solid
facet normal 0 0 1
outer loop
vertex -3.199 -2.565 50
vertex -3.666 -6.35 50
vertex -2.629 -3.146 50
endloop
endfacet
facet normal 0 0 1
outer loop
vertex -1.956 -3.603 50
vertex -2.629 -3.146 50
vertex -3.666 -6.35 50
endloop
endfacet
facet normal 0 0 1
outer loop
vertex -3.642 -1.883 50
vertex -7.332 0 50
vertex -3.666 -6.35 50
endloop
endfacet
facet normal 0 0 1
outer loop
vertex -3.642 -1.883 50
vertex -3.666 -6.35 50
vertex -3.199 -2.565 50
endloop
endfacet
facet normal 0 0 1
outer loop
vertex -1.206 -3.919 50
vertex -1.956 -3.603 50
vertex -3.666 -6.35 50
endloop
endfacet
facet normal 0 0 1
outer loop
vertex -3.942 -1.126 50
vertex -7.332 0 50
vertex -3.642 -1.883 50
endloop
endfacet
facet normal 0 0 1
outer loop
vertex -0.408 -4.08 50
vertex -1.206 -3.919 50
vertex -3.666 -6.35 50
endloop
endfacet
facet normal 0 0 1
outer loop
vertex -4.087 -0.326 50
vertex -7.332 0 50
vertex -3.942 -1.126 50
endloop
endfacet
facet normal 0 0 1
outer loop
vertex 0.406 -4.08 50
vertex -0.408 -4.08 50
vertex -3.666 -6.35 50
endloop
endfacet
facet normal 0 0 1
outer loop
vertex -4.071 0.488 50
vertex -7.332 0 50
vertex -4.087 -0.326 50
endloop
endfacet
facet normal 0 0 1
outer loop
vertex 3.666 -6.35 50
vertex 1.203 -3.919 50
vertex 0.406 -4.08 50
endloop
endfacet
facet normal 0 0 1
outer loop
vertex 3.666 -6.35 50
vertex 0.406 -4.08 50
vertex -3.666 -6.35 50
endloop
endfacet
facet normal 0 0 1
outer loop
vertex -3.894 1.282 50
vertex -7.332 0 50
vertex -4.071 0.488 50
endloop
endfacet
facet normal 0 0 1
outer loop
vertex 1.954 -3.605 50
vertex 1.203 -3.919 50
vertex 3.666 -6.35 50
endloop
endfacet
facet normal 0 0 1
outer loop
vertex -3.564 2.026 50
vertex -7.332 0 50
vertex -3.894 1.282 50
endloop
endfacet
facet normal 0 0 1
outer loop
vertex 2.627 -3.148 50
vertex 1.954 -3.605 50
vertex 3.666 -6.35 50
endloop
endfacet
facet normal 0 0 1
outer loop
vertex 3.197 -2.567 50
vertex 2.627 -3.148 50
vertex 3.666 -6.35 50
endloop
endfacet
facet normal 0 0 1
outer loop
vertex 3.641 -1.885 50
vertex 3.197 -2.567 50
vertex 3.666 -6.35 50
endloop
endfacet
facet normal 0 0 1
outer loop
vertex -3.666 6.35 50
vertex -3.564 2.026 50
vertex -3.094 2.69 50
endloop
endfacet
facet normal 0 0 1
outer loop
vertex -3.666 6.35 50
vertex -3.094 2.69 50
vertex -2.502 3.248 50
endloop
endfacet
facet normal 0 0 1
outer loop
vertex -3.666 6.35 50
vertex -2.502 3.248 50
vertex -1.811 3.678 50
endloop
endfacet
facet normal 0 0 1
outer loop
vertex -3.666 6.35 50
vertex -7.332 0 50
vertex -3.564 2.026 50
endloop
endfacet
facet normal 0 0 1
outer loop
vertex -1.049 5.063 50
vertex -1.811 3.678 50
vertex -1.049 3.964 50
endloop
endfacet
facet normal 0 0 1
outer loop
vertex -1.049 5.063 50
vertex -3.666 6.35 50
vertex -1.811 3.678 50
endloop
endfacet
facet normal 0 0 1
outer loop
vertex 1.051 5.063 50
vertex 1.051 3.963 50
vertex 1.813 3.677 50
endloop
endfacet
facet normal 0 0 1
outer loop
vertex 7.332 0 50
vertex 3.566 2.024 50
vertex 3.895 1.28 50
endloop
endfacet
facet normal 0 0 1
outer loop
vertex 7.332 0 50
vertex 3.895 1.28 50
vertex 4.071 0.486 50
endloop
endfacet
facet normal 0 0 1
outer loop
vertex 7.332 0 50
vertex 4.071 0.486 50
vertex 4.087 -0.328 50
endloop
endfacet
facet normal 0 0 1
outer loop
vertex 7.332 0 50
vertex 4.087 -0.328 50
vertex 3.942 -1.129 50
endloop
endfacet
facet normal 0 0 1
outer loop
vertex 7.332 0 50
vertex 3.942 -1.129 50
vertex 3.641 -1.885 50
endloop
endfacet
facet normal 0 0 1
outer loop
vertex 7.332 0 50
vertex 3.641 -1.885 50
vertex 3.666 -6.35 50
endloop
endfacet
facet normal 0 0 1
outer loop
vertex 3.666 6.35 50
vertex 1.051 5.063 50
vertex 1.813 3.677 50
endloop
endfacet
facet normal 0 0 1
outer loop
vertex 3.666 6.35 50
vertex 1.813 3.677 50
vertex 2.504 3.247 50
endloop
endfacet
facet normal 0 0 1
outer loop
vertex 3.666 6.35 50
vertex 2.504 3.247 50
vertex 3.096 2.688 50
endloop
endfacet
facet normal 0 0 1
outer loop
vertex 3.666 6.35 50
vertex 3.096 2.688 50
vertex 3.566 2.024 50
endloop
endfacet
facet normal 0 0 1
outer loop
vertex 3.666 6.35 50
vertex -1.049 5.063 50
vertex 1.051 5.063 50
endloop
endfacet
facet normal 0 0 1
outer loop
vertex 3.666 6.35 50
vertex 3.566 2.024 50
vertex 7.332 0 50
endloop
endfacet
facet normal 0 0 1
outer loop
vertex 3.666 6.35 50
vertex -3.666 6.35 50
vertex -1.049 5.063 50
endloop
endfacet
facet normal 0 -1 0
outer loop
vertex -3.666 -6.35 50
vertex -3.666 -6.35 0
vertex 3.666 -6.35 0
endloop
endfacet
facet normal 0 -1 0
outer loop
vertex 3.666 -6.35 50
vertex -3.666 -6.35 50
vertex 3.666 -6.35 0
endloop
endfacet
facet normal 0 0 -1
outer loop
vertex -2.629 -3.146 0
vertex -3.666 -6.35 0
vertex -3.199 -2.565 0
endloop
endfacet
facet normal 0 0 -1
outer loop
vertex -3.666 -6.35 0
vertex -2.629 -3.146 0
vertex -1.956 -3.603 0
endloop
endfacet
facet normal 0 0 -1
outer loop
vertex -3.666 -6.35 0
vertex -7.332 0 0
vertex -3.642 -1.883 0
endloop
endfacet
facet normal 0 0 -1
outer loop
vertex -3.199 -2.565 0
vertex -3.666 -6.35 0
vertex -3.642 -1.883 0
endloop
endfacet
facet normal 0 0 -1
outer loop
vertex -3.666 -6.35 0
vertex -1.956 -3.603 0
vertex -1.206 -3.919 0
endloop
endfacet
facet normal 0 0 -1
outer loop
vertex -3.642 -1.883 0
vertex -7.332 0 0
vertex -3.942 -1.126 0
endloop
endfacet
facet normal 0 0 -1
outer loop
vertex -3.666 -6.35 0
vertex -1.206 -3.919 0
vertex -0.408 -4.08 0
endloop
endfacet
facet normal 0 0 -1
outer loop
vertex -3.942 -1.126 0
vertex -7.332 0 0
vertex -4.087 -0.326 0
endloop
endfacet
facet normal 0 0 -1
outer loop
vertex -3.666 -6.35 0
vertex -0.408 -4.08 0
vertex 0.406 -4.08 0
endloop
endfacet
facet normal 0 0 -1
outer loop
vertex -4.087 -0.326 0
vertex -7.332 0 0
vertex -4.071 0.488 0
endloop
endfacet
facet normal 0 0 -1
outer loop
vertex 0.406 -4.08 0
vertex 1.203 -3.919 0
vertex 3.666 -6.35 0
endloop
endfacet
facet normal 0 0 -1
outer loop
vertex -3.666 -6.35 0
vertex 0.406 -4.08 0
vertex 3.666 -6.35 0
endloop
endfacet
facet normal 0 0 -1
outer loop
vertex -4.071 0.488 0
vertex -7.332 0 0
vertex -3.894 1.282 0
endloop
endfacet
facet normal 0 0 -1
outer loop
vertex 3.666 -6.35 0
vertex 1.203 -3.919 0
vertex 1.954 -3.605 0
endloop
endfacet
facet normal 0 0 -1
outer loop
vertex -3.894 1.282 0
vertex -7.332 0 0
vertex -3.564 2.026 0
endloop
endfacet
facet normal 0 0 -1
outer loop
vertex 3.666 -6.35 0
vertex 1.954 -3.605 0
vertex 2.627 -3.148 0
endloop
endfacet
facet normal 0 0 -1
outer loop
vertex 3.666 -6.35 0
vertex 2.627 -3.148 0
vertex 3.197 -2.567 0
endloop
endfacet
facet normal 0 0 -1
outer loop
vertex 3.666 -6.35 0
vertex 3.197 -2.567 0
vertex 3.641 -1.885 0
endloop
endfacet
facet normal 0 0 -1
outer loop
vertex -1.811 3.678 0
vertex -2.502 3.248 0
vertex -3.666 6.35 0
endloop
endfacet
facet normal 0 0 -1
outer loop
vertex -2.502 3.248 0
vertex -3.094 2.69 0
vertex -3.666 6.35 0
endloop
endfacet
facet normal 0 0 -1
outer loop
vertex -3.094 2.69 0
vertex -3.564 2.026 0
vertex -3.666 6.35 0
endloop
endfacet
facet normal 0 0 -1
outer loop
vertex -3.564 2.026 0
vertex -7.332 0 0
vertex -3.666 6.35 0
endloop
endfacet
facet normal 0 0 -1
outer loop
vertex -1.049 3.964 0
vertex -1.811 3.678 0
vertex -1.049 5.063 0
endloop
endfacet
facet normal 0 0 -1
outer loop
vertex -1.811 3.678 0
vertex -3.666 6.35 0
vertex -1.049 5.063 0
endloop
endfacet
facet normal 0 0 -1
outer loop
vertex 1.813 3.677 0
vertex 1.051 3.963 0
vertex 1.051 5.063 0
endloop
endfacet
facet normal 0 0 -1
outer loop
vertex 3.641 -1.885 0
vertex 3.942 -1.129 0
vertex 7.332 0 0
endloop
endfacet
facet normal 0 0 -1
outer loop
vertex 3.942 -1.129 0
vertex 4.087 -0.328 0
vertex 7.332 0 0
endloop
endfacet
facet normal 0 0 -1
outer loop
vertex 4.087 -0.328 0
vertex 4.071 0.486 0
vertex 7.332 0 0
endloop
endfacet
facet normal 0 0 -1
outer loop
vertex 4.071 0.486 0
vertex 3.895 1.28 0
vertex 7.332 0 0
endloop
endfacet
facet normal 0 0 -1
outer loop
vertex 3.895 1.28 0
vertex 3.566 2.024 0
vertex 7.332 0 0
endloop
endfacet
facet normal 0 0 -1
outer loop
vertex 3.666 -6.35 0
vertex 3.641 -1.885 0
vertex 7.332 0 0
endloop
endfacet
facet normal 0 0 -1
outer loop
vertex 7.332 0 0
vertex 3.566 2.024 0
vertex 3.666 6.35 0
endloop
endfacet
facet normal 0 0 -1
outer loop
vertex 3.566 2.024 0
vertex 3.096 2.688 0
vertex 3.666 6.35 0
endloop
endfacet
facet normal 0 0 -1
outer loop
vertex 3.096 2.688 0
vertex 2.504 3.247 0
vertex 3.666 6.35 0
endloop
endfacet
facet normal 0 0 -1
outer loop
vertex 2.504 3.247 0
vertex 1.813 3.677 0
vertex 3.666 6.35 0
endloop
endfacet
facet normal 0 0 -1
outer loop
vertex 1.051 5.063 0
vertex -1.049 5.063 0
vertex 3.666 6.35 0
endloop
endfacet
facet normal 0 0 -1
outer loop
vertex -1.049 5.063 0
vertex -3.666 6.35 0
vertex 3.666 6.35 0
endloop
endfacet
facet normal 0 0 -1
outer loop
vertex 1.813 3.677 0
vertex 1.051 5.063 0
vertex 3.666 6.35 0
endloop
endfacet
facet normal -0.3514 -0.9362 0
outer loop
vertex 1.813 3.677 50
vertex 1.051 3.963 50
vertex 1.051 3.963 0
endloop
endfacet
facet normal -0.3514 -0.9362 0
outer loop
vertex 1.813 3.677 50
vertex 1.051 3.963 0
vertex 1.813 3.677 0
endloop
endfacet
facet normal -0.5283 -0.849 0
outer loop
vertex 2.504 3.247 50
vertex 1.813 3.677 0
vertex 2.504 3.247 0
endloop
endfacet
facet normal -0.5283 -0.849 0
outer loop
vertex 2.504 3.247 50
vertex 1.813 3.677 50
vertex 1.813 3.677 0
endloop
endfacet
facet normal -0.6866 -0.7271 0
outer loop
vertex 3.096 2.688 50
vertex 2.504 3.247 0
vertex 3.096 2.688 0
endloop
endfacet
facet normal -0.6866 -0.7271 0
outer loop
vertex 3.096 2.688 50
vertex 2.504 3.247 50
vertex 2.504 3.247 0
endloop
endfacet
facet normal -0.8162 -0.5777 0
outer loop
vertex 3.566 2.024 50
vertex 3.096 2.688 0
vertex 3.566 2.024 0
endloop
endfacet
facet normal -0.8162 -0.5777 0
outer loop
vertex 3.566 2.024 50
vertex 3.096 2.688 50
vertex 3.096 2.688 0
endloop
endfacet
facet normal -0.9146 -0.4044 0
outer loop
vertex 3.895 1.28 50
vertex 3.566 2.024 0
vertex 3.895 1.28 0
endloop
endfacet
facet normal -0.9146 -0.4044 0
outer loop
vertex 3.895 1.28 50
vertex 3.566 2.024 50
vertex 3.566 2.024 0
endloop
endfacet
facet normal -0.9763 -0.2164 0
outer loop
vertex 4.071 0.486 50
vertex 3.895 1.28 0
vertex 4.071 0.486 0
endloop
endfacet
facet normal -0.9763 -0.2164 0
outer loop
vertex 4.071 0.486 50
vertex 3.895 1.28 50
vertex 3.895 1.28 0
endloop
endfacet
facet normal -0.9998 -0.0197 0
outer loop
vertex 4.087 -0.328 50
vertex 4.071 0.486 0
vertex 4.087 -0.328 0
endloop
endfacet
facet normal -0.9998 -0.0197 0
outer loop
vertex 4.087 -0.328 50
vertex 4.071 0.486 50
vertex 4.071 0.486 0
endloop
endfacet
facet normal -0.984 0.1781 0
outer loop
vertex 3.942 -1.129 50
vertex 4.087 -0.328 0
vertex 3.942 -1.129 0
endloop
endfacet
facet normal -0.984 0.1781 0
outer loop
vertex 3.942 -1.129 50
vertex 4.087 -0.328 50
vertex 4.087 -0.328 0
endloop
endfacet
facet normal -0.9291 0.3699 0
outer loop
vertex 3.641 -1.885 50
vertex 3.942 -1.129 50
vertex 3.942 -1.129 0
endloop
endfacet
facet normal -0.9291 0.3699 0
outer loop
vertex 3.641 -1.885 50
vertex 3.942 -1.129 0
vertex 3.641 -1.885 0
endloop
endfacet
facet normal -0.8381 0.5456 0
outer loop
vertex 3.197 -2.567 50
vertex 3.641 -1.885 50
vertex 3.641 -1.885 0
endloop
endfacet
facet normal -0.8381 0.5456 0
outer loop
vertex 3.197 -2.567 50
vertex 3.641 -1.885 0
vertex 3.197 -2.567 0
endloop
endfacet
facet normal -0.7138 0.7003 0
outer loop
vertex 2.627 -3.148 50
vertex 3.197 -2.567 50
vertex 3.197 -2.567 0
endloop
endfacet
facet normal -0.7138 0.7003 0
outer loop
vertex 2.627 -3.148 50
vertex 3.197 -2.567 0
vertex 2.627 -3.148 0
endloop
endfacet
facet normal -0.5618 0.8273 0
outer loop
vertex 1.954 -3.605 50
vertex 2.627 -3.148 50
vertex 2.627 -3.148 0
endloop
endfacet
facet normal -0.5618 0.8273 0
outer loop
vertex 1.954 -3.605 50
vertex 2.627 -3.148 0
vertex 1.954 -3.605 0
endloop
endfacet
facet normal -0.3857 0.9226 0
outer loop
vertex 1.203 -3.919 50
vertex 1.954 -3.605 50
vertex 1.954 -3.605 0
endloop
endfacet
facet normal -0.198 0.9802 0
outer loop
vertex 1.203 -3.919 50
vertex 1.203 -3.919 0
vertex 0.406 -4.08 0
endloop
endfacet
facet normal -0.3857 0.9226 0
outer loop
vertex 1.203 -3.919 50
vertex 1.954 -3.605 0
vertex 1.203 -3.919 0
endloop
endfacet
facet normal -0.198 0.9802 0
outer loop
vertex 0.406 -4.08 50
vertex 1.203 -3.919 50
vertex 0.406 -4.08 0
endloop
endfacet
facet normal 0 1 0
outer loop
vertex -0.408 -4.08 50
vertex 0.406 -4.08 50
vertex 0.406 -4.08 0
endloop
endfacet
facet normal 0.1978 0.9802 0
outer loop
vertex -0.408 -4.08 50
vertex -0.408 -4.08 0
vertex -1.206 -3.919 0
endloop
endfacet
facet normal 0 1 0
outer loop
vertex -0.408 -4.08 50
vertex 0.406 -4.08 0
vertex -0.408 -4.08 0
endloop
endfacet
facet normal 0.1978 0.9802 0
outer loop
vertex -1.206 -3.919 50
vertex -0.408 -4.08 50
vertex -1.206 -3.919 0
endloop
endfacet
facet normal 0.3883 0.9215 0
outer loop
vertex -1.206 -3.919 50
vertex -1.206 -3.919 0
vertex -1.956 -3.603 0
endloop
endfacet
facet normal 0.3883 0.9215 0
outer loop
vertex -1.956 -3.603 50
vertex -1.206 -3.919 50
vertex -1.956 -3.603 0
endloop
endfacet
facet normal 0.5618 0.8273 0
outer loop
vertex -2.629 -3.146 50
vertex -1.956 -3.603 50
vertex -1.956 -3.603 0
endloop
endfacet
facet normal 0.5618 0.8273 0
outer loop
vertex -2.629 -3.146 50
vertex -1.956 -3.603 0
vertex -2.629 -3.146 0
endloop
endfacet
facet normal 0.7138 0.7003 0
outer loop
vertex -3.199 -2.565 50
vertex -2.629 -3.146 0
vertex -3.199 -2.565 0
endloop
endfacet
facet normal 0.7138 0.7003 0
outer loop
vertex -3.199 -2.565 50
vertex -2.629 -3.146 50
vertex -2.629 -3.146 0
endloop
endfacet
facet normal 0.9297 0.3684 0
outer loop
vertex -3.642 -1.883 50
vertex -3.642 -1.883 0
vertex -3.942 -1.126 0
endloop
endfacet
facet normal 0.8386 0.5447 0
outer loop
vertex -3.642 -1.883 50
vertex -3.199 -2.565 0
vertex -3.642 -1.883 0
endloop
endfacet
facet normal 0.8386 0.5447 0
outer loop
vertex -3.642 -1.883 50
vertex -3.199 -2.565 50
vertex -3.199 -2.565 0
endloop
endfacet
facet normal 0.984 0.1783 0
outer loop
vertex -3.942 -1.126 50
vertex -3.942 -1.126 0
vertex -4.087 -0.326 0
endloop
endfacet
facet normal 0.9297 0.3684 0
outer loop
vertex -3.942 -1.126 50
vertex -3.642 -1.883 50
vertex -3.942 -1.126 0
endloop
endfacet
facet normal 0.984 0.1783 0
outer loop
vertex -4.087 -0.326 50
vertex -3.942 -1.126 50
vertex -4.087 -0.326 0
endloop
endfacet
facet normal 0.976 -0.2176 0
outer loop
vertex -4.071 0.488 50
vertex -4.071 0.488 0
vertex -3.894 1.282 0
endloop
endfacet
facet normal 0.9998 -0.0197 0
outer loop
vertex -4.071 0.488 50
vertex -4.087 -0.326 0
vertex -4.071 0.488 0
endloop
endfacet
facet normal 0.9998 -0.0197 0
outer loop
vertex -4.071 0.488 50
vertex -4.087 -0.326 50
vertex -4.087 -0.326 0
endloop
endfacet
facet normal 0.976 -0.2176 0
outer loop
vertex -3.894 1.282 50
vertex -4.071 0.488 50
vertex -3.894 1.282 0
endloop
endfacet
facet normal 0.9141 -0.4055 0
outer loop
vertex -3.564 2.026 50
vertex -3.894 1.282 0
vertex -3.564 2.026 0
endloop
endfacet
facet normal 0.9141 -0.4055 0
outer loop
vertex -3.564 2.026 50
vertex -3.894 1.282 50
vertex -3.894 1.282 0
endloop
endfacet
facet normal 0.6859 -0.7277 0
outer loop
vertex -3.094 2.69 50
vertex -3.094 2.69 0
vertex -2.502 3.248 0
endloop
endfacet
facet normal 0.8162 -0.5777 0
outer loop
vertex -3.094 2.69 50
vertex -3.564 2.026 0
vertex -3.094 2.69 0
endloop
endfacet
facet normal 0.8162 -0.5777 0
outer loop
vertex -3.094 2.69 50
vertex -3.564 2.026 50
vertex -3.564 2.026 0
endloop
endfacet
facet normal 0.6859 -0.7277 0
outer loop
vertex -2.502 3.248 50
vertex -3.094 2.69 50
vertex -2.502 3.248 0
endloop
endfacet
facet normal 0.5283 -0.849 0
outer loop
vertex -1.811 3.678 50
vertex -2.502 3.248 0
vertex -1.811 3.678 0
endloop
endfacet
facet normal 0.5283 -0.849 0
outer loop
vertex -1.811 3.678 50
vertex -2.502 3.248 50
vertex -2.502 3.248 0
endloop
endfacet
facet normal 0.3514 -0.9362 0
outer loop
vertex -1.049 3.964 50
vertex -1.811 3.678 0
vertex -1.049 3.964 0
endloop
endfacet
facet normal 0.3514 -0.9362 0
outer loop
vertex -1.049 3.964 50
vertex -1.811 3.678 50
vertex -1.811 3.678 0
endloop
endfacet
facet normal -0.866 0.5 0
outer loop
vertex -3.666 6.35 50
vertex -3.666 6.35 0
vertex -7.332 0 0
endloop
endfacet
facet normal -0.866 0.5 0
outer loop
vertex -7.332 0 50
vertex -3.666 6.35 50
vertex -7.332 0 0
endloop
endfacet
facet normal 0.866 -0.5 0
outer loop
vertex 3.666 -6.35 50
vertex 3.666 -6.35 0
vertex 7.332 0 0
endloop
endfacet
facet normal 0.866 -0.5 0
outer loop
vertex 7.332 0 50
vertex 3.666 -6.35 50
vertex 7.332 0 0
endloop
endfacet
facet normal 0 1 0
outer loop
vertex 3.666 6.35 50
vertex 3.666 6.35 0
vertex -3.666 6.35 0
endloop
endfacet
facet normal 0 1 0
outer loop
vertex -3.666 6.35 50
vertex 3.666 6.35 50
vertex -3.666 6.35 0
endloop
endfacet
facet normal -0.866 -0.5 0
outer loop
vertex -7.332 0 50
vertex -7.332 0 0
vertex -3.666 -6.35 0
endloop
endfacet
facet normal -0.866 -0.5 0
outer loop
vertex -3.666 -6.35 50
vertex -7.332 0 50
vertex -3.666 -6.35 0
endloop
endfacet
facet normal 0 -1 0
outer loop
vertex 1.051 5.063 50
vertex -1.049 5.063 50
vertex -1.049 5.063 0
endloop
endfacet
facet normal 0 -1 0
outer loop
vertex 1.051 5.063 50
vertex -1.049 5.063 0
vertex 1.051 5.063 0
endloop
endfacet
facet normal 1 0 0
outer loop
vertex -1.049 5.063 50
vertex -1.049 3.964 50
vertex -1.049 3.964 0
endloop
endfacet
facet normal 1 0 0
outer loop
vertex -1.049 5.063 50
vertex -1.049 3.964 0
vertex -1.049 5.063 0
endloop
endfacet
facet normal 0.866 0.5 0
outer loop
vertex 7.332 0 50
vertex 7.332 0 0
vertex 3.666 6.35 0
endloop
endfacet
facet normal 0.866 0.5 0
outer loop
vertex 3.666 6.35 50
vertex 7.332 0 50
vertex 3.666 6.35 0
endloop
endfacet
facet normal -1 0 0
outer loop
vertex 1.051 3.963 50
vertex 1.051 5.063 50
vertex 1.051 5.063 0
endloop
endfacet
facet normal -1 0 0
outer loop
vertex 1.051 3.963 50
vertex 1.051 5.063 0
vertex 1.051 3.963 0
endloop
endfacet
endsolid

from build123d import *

# Parameters (mm, degrees)
BOSS_EXTRUDE1_DEPTH = 50
CUT_EXTRUDE1_DEPTH  = 51


with BuildPart() as part:
    # Sketch1 → Boss-Extrude1 (new body)
    with BuildSketch(Plane.XY):
        Polygon((7.332348419, 0), (3.666174209, 6.35), (-3.666174209, 6.35), (-7.332348419, 0), (-3.666174209, -6.35), (3.666174209, -6.35), align=None)
    extrude(amount=BOSS_EXTRUDE1_DEPTH)

    # Sketch2 → Cut-Extrude1 (cut, through all)
    with BuildSketch(Plane.XY.offset(50)):
        with BuildLine():
            Line((-1.048881406, 3.963565036), (-1.048881406, 5.062972332))
            Line((-1.048881406, 5.062972332), (1.051118594, 5.062972332))
            Line((1.051118594, 5.062972332), (1.051118594, 3.962972332))
            ThreePointArc((1.051118594, 3.962972332), (-0.001157185, -4.099999837), (-1.048881406, 3.963565036))
        make_face()
    extrude(amount=-CUT_EXTRUDE1_DEPTH, mode=Mode.SUBTRACT)


solid = part.part
